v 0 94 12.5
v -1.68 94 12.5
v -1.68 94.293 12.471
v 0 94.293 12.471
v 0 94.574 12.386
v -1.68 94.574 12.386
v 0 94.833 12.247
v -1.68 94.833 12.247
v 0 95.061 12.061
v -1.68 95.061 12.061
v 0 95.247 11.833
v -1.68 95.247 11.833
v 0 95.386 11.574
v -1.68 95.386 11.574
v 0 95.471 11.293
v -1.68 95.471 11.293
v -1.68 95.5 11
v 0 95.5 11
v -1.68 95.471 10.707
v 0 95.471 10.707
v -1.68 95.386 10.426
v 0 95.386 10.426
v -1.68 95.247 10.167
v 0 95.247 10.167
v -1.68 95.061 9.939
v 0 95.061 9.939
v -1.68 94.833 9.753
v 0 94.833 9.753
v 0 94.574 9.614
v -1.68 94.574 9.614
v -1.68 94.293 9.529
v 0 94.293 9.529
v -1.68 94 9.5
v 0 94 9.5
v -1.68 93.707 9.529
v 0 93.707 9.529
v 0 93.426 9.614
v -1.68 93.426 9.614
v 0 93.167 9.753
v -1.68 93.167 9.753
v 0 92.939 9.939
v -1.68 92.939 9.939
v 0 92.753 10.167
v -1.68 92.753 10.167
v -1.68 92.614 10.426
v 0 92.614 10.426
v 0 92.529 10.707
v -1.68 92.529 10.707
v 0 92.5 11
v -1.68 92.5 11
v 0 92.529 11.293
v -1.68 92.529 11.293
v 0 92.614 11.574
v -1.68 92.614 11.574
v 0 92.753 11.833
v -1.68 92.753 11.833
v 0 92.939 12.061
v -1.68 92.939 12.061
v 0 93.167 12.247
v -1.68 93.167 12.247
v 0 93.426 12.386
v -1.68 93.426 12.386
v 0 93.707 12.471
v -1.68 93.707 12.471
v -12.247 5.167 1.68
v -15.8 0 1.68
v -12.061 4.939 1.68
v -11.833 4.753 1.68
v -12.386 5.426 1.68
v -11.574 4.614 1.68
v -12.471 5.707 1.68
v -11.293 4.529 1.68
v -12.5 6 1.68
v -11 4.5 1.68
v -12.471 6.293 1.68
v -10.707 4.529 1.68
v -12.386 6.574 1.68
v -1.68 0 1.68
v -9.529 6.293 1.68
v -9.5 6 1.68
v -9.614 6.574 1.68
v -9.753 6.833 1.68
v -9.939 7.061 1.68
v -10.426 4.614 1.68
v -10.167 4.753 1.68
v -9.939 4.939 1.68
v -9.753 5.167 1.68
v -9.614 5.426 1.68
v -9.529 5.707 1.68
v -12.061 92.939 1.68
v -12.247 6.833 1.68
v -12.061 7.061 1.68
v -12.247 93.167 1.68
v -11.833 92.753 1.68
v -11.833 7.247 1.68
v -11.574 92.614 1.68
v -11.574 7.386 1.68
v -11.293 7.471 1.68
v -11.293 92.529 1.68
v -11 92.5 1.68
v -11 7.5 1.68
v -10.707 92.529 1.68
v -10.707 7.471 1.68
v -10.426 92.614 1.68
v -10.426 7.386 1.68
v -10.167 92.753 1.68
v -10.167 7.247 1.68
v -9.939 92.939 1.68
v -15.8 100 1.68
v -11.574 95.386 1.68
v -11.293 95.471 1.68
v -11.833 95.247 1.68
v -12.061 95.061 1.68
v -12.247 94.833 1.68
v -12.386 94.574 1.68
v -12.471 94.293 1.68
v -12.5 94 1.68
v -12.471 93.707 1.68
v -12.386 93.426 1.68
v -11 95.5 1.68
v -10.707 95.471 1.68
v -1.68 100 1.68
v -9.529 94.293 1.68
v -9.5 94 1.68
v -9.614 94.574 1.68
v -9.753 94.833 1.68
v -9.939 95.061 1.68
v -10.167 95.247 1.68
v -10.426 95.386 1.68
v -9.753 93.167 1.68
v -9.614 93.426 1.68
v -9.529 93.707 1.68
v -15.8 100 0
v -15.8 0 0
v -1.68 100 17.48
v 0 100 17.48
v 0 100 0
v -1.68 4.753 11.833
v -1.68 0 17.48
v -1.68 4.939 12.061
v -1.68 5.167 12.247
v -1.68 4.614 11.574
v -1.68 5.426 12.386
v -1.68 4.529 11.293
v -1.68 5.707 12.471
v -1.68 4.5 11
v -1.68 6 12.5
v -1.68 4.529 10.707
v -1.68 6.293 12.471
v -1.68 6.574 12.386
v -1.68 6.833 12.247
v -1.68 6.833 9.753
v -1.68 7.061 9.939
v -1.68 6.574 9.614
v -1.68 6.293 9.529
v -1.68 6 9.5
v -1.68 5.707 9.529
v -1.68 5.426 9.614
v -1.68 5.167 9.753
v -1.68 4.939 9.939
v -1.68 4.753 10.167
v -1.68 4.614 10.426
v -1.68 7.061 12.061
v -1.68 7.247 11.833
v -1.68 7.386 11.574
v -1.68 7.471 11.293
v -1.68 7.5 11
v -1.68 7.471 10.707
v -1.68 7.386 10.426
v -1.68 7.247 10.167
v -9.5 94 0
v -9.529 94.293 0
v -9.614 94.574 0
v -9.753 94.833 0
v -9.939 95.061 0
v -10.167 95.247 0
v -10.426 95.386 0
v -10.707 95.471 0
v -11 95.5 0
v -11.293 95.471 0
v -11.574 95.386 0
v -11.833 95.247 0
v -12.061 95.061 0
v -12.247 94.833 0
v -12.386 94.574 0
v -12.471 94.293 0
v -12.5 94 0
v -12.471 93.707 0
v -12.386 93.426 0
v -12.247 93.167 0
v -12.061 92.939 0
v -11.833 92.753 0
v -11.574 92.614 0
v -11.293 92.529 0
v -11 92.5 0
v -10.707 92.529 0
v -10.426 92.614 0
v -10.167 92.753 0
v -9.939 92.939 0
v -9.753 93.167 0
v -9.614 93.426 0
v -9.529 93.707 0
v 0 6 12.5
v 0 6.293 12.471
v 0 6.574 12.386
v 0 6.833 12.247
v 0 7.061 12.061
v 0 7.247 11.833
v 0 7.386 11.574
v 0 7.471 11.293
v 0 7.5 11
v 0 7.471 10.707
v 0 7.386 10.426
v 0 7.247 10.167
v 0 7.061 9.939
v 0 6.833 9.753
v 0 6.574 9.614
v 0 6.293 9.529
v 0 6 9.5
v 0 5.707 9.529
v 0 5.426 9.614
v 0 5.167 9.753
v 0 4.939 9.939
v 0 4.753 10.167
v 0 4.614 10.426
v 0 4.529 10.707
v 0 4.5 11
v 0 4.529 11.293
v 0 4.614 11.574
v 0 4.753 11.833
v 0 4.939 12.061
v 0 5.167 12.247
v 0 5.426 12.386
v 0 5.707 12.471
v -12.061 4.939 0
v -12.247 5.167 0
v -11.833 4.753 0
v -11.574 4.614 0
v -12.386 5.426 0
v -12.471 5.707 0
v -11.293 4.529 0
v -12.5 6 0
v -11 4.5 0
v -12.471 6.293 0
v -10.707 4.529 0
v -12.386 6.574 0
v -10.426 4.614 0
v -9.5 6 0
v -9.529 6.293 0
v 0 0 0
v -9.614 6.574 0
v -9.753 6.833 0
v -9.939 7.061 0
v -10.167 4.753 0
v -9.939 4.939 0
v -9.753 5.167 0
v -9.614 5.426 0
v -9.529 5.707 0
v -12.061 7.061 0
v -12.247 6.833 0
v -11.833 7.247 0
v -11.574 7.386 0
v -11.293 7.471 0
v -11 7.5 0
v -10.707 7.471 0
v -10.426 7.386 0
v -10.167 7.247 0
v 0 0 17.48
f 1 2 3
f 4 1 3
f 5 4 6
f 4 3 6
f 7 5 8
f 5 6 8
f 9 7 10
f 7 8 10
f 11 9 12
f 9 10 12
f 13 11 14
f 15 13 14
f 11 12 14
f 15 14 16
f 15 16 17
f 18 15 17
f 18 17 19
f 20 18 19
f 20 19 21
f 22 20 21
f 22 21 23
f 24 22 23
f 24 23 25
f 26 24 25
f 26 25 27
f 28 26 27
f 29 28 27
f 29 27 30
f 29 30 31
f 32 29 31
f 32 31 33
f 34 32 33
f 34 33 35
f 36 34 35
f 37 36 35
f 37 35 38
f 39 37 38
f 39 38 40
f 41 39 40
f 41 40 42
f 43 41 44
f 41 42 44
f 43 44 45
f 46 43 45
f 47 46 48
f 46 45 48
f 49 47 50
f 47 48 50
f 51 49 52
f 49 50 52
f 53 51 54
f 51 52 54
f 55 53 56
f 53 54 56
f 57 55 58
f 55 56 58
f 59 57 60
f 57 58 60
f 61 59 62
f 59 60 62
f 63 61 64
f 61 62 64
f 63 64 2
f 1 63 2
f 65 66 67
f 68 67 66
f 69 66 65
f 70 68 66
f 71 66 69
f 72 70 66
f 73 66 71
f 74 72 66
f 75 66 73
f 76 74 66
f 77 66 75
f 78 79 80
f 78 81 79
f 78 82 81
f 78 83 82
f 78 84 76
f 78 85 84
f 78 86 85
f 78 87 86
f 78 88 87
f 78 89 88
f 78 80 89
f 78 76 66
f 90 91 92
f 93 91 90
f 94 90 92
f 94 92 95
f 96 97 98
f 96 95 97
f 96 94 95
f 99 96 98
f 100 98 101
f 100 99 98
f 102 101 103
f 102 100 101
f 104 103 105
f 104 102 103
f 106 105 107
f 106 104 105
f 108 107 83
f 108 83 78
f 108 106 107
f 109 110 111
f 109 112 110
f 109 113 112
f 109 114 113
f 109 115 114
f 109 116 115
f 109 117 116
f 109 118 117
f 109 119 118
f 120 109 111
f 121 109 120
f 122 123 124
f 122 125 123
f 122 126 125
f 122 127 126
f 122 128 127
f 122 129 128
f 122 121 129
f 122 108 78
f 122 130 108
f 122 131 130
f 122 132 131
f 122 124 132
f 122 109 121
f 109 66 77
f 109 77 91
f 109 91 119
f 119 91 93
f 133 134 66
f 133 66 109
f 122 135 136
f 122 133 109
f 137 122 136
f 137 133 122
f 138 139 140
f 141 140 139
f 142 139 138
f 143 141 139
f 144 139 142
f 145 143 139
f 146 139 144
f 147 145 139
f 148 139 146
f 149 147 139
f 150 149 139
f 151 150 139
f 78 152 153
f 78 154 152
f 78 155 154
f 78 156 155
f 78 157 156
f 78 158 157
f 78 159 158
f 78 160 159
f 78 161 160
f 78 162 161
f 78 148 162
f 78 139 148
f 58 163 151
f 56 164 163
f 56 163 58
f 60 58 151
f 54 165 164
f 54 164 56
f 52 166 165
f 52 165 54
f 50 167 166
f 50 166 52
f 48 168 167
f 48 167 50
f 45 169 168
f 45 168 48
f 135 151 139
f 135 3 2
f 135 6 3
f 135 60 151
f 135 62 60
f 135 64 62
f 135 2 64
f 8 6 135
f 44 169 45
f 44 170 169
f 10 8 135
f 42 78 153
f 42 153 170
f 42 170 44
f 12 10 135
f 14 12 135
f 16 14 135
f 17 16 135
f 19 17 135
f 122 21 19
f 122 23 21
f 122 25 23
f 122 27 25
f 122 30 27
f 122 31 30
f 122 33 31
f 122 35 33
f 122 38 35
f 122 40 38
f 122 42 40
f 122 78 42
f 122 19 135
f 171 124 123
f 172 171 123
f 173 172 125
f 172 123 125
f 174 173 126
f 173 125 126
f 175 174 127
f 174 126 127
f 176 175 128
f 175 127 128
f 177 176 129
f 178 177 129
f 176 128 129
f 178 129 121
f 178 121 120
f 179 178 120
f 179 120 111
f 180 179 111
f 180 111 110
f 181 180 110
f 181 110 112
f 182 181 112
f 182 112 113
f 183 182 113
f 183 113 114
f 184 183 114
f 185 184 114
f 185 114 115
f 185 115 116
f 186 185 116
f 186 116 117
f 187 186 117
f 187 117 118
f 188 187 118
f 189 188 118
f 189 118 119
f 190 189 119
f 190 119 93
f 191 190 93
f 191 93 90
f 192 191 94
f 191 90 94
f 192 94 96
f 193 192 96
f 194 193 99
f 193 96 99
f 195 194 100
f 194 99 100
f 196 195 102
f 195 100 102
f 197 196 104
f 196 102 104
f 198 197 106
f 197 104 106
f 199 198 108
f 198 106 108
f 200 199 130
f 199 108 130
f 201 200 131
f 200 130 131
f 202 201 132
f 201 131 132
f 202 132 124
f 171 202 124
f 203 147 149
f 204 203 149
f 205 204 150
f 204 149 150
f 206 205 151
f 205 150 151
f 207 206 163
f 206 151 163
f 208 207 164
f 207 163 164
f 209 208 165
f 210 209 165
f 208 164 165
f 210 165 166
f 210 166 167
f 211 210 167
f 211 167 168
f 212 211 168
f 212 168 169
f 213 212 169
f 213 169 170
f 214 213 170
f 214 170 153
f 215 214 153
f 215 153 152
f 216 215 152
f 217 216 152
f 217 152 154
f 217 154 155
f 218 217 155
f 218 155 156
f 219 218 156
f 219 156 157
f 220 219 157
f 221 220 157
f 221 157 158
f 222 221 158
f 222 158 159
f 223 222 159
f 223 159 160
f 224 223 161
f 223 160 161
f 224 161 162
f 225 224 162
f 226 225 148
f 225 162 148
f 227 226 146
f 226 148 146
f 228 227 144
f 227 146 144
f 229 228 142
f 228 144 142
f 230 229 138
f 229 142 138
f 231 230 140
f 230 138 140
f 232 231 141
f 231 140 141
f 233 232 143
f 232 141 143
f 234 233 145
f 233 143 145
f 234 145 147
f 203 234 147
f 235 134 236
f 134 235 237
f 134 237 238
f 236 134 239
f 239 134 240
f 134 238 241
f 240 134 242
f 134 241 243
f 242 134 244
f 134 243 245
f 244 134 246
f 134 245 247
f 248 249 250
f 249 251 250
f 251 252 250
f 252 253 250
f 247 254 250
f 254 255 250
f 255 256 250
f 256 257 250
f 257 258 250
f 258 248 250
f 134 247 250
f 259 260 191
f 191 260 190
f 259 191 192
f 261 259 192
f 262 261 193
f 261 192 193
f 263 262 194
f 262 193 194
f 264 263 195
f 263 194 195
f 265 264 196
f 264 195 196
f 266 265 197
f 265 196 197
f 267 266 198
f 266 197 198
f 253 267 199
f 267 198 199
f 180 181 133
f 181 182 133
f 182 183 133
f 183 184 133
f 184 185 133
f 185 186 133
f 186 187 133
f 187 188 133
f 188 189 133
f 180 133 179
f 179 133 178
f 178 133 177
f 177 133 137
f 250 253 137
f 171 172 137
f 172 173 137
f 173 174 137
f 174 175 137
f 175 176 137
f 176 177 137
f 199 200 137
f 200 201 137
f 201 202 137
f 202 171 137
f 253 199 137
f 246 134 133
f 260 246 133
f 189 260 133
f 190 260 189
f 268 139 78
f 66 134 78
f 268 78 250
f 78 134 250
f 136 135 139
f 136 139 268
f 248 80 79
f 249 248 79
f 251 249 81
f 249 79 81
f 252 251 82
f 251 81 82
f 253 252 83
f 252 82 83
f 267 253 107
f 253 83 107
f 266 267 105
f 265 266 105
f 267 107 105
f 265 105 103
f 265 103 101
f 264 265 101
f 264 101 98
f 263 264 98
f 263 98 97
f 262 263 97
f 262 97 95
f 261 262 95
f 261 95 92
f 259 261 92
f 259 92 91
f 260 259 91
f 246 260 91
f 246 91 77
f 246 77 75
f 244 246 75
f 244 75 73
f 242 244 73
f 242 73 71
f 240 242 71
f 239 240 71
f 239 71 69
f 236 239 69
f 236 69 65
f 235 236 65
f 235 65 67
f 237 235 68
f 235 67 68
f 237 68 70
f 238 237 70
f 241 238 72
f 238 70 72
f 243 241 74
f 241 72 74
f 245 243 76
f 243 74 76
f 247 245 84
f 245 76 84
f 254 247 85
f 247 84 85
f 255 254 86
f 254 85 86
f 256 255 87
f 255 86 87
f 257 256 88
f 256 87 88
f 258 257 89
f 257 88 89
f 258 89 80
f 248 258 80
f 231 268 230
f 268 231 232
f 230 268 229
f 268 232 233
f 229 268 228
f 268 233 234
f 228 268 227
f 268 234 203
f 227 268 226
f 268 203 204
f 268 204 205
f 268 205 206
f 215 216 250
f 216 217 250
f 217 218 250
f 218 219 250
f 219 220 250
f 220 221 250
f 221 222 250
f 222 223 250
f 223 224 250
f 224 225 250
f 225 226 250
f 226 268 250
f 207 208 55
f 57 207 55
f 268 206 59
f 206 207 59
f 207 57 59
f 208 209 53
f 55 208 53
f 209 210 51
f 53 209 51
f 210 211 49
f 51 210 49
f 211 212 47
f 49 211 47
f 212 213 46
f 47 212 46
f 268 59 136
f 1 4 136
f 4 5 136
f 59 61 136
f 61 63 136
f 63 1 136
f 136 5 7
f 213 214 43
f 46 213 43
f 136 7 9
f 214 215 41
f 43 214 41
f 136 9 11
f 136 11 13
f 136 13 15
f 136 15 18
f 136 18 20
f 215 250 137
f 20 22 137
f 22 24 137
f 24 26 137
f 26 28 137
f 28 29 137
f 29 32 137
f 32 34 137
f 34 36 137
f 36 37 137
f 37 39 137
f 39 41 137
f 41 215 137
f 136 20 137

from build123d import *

# Parameters (mm, degrees)
ESBO_O1_W                = 15.8
ESBO_O1_H                = 100
RESSALTO_EXTRUS_O1_DEPTH = 1.68
ESBO_O3_W                = 1.68
ESBO_O3_H                = 100
RESSALTO_EXTRUS_O2_DEPTH = 15.8
ESBO_O4_R                = 1.5
CORTE_EXTRUS_O1_DEPTH    = 103.493535406
ESBO_O5_R                = 1.5
CORTE_EXTRUS_O2_DEPTH    = 103.465994359


with BuildPart() as part:
    # Esboço1 → Ressalto-extrusão1 (new body)
    with BuildSketch(Plane.XY):
        with Locations((-7.9, 50)):
            Rectangle(ESBO_O1_W, ESBO_O1_H)
    extrude(amount=RESSALTO_EXTRUS_O1_DEPTH)

    # Esboço3 → Ressalto-extrusão2 (add)
    with BuildSketch(Plane.XY.offset(1.68)):
        with Locations((-0.84, 50)):
            Rectangle(ESBO_O3_W, ESBO_O3_H)
    extrude(amount=RESSALTO_EXTRUS_O2_DEPTH)

    # Esboço4 → Corte-extrusão1 (cut, through all)
    with BuildSketch(Plane.ZY.offset(1.68)):
        with Locations((11, 94)):
            Circle(ESBO_O4_R)
        with Locations((11, 6)):
            Circle(ESBO_O4_R)
    extrude(amount=-CORTE_EXTRUS_O1_DEPTH, mode=Mode.SUBTRACT)

    # Esboço5 → Corte-extrusão2 (cut, through all)
    with BuildSketch(Plane.XY.offset(1.68)):
        with Locations((-11, 94)):
            Circle(ESBO_O5_R)
        with Locations((-11, 6)):
            Circle(ESBO_O5_R)
    extrude(amount=-CORTE_EXTRUS_O2_DEPTH, mode=Mode.SUBTRACT)


solid = part.part
